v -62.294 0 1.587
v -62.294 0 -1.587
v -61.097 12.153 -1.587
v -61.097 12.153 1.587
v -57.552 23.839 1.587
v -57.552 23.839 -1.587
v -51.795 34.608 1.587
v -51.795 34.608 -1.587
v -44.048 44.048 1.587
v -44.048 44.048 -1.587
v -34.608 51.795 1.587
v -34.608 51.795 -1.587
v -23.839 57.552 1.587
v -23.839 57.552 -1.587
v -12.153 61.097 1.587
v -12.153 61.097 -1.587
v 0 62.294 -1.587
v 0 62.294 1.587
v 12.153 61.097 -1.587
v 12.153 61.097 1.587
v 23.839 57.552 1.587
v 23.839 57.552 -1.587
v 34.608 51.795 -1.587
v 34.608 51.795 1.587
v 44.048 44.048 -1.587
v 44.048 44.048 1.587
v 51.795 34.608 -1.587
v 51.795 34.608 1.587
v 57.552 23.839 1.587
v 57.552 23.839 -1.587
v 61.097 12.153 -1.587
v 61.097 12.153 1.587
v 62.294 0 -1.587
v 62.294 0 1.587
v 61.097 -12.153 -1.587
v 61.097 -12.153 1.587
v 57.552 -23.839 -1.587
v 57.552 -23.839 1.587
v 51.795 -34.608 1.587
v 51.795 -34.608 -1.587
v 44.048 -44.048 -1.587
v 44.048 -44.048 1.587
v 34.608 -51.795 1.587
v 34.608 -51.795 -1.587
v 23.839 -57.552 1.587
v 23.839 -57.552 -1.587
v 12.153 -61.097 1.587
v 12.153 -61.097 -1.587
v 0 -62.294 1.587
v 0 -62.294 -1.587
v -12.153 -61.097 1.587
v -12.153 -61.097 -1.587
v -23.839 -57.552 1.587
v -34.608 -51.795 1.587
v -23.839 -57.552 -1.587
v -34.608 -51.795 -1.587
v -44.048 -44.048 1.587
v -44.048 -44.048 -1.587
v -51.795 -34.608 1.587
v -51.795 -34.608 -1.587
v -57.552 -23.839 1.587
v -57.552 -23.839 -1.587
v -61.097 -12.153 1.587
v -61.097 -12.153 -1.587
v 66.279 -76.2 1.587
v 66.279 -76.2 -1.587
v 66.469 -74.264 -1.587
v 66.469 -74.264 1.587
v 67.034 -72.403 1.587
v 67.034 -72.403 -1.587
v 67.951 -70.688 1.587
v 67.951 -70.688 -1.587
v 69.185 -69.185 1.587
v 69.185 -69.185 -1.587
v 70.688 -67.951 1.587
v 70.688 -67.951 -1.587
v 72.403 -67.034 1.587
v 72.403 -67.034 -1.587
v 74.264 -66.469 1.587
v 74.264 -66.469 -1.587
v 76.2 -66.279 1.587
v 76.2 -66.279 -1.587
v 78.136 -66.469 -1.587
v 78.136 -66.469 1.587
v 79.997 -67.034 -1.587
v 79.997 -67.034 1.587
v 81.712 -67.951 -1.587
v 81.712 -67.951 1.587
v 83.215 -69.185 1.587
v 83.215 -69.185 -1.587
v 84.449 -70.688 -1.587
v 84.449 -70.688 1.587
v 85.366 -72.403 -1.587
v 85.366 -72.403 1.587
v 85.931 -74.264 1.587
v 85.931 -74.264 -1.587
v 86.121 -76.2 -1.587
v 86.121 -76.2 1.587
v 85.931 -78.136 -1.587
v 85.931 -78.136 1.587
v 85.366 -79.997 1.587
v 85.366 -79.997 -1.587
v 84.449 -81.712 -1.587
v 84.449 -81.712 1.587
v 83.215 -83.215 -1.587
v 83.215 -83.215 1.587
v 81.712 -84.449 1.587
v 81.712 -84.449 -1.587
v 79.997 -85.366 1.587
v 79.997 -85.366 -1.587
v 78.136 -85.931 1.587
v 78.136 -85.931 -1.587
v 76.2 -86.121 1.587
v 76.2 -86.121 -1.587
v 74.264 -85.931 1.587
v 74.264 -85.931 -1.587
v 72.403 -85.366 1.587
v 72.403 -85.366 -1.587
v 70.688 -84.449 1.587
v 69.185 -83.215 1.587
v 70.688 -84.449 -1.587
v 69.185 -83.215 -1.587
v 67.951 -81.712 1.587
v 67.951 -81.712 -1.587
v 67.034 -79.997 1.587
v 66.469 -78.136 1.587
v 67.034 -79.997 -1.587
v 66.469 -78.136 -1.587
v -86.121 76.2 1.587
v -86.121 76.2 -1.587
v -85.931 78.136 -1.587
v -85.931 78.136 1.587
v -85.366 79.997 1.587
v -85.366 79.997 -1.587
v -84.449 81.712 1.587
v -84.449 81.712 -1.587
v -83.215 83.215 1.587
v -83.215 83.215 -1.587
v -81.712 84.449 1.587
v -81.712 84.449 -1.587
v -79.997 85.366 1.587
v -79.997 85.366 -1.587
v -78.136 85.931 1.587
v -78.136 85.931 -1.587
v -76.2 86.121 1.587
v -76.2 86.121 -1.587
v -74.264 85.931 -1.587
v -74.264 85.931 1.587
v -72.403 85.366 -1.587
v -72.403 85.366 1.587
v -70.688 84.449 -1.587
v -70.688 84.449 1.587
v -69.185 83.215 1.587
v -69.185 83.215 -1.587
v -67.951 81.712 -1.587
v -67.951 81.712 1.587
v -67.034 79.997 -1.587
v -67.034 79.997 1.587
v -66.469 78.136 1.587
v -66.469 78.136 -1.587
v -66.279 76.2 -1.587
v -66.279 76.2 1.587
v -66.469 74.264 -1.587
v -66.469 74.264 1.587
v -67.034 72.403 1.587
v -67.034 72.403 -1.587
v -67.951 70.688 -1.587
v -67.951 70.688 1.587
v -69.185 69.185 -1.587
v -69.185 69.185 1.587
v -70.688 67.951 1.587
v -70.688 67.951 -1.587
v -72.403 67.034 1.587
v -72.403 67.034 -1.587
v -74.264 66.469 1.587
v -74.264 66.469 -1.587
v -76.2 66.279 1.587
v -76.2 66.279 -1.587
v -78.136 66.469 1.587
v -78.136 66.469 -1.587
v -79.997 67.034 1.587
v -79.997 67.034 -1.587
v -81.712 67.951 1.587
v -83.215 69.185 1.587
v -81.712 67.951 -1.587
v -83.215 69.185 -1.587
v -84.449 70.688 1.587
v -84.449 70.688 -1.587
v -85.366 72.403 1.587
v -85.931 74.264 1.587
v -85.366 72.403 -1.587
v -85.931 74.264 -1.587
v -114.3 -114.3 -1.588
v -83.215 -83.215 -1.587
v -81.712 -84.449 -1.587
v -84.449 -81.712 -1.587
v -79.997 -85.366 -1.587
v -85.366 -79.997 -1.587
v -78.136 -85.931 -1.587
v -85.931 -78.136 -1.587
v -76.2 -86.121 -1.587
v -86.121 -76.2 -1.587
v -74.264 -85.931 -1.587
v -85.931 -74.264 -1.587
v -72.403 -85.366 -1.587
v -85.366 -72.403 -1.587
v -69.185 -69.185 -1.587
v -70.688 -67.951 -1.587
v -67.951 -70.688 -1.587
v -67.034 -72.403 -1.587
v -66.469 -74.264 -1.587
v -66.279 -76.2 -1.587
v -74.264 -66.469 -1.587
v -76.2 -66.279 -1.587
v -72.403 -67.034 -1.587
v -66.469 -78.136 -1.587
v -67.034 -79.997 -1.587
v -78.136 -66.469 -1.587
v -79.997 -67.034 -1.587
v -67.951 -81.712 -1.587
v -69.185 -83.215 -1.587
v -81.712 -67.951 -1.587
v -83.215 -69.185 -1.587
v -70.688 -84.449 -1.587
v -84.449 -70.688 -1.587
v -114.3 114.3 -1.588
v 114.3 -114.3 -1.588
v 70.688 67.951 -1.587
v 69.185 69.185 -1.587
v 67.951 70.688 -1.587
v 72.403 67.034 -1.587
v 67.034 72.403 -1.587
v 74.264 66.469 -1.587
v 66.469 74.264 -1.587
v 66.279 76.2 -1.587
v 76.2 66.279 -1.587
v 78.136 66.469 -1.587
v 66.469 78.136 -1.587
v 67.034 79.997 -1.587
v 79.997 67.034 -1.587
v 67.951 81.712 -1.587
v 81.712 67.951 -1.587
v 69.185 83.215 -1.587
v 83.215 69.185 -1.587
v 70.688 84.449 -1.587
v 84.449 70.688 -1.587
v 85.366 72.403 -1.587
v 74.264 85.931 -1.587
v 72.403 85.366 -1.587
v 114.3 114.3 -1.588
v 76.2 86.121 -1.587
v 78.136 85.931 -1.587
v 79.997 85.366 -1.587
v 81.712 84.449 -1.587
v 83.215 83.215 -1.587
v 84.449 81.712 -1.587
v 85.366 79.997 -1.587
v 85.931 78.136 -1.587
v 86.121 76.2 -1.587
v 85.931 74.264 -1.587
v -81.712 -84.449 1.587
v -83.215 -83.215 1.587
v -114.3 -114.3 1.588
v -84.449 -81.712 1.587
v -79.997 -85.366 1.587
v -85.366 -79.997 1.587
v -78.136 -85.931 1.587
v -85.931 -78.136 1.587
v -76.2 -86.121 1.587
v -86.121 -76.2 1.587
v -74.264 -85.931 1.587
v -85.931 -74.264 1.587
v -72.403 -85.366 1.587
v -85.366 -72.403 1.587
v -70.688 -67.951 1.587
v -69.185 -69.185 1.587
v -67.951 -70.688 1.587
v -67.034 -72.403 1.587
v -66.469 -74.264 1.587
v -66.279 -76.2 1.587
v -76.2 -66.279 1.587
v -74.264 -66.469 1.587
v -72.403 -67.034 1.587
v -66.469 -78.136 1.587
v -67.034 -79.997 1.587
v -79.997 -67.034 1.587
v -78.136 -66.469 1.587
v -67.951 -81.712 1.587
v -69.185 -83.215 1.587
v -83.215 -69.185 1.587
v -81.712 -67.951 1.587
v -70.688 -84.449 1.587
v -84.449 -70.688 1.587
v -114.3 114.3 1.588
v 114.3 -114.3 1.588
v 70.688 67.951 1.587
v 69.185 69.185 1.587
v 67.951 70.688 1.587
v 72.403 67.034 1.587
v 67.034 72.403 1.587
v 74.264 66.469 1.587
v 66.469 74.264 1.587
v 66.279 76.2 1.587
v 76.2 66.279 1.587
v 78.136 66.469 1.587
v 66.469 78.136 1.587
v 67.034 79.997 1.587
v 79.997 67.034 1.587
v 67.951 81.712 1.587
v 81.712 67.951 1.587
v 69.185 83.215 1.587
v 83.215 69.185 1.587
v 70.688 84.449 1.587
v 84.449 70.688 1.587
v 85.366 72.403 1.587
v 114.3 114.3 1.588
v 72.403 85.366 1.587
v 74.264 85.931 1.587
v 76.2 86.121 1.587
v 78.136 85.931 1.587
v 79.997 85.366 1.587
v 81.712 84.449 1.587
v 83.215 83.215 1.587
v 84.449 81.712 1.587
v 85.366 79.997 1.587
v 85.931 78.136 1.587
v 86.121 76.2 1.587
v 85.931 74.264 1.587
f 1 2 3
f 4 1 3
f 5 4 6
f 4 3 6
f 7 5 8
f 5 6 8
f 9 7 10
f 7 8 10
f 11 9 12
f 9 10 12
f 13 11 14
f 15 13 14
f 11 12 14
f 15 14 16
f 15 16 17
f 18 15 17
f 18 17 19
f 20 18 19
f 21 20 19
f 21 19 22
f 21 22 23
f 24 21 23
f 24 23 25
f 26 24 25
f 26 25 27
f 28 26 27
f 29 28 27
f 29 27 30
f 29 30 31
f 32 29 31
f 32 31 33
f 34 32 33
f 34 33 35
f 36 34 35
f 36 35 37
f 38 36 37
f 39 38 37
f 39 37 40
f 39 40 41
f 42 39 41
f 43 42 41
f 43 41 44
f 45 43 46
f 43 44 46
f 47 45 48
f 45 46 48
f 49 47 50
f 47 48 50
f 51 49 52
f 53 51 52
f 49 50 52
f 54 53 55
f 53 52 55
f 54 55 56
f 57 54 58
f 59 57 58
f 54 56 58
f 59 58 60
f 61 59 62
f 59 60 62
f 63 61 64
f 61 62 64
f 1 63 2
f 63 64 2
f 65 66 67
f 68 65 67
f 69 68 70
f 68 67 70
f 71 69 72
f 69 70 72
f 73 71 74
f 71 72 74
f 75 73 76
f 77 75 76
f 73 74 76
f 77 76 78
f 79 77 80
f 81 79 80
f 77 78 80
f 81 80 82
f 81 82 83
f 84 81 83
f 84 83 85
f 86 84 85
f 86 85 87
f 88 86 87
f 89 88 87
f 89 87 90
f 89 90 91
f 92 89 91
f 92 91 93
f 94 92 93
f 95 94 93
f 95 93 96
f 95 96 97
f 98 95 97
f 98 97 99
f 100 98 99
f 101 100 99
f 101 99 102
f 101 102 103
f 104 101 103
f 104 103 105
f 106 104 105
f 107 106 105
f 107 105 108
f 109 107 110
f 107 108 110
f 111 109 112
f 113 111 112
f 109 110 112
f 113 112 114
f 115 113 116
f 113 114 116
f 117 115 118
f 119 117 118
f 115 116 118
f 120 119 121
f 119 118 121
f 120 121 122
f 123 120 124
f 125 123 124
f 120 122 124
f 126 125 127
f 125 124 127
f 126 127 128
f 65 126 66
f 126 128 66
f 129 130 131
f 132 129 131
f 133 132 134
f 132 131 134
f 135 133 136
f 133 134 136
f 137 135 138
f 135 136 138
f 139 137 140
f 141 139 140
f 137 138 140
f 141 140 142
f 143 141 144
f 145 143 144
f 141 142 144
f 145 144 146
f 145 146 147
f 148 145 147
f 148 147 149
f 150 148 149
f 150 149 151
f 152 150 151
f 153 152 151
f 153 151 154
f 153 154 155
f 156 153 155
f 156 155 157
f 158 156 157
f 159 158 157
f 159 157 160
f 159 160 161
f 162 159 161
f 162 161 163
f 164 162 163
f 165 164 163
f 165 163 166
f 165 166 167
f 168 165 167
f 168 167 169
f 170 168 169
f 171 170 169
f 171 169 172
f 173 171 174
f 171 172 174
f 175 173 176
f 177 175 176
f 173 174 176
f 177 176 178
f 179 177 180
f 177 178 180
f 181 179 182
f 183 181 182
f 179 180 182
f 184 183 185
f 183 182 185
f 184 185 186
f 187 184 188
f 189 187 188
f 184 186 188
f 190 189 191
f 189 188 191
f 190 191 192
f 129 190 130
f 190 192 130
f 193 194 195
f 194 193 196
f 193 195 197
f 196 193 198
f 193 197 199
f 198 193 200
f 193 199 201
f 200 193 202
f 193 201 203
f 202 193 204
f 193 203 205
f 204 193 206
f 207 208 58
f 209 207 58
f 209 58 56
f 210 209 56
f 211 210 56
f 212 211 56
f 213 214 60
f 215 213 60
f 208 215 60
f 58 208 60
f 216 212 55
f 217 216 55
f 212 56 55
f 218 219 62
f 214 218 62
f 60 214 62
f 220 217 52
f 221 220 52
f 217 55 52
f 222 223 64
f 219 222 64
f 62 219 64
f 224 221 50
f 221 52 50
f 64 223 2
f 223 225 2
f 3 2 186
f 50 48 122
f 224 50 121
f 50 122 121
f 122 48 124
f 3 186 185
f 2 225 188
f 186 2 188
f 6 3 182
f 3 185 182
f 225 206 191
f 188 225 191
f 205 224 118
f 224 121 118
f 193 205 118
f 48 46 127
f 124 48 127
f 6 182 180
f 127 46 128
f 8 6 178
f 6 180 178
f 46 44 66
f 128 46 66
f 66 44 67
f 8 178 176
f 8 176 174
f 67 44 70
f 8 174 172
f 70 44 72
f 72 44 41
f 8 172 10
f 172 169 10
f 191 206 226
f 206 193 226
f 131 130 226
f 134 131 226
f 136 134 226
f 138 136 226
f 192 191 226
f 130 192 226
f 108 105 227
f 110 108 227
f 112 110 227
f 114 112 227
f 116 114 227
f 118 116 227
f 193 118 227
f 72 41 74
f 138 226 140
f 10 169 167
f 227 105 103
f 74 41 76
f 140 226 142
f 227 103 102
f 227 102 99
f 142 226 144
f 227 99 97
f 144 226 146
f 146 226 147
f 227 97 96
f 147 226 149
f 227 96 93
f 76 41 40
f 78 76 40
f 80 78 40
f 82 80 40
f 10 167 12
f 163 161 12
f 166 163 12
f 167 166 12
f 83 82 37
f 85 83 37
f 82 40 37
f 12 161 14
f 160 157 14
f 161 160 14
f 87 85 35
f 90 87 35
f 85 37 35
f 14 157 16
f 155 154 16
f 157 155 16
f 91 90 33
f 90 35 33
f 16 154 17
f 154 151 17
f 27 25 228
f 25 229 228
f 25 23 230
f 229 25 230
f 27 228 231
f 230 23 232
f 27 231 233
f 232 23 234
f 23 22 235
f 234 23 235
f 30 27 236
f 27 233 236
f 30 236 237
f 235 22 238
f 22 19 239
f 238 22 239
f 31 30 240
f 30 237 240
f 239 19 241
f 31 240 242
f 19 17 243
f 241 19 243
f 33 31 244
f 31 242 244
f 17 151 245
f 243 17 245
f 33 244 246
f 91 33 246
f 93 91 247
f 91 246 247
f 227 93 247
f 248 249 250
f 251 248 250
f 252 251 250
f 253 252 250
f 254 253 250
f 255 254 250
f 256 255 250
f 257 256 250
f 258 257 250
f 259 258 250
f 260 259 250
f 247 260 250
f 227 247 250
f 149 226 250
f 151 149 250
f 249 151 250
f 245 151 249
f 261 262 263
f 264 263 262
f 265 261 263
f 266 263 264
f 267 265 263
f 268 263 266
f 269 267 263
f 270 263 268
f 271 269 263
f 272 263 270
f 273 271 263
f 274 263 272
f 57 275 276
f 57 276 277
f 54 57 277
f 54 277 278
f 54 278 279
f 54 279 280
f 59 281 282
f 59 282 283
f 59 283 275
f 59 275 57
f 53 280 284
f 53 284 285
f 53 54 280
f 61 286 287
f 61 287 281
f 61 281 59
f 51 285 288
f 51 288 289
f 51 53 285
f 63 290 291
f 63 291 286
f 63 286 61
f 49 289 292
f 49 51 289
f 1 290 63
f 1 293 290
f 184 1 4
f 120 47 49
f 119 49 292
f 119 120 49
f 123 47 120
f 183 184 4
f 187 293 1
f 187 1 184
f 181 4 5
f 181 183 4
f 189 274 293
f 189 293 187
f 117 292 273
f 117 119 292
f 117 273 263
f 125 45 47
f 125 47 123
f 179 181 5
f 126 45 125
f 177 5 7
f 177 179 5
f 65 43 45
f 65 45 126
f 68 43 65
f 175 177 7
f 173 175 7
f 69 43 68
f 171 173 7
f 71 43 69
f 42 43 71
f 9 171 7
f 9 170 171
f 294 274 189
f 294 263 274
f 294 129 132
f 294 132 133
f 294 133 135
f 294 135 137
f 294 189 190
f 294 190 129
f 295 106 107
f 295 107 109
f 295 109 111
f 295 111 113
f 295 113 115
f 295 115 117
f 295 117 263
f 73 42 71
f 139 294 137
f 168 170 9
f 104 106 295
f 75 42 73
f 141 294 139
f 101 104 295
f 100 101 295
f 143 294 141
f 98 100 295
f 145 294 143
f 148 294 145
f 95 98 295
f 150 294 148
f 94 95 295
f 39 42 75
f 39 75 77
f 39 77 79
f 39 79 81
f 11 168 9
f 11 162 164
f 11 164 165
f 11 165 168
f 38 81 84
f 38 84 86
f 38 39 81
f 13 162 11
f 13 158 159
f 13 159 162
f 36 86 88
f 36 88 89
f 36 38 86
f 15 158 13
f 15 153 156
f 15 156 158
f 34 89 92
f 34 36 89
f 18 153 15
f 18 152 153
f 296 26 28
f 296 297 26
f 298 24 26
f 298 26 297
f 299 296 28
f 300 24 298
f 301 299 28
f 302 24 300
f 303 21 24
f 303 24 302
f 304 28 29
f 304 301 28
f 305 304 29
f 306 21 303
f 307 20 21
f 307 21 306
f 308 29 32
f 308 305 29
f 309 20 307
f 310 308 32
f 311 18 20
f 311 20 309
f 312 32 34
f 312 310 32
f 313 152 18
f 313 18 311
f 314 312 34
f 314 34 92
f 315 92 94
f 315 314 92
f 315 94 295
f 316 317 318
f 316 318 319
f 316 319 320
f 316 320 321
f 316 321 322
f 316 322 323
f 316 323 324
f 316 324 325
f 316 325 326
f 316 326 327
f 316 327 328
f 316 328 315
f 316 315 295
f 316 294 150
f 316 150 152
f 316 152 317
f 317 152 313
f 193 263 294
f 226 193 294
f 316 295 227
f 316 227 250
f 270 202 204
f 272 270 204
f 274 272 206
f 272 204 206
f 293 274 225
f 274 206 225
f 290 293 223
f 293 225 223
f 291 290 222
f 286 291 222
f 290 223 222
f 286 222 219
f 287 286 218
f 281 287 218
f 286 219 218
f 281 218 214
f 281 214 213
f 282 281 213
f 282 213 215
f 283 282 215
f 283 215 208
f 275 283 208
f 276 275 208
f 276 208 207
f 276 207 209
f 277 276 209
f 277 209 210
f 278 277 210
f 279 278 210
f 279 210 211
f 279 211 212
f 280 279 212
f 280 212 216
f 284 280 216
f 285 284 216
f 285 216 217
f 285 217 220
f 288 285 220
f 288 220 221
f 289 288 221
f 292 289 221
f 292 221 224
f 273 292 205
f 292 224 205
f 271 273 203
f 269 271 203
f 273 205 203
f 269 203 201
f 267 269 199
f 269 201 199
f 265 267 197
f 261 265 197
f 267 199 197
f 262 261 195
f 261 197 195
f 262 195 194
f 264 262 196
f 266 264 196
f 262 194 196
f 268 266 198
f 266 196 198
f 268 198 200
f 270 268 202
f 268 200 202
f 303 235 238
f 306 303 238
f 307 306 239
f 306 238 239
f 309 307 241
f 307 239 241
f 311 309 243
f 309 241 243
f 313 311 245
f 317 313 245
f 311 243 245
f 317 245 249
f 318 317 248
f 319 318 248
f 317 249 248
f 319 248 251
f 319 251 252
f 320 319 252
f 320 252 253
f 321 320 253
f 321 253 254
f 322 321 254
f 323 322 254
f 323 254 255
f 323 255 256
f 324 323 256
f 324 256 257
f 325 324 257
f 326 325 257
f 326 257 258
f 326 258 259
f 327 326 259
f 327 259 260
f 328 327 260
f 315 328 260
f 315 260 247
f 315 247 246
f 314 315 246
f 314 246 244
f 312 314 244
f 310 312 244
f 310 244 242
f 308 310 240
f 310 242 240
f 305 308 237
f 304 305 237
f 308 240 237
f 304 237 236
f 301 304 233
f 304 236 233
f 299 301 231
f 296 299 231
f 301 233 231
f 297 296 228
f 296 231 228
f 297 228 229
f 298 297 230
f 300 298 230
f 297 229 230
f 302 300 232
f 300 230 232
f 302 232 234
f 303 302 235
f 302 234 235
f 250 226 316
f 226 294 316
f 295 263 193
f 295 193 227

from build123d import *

# Parameters (mm, degrees)
F0_W     = 228.6
F0_H     = 228.6
F1_DEPTH = 1.5875
F3_D     = 19.84248
F4_D     = 124.587


with BuildPart() as f1:
    # F0 (on Top) → F1 (new body, symmetric)
    with BuildSketch(Plane.XY):
        Rectangle(F0_W, F0_H)
    extrude(amount=F1_DEPTH, both=True)

    # F3 (through all)
    with Locations(Plane.XY.offset(1.5875)):
        with Locations((-76.2, 76.2), (76.2, 76.2), (-76.2, -76.2), (76.2, -76.2)):
            Hole(F3_D / 2)

    # F4 (through all)
    with Locations(Plane.XY.offset(1.5875)):
        with Locations((0, 0)):
            Hole(F4_D / 2)


solid = f1.part
